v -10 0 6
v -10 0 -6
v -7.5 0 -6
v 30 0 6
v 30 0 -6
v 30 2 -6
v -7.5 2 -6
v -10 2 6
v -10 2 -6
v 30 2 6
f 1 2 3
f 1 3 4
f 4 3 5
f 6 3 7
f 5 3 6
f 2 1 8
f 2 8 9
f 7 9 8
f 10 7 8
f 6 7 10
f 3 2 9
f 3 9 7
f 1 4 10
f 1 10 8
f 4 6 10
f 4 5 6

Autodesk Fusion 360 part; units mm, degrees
sketch "Esquisse1" plane through (0, 0, 0) normal (0, 1, 0) x (1, 0, 0)
  line L0 (-10, 6) -> (30, 6)
  line L1 (30, 6) -> (30, -6)
  line L2 (30, -6) -> (-10, -6)
  line L3 (-10, -6) -> (-10, 6)
  line L4 (-10, 6) -> (-10, -6)
  line L5 (30, -6) -> (30, 6)
  line L6 (-7.5, 6) -> (-10, 6)
  line L7 (-10, 6) -> (-10, -6)
  line L8 (30, 6) -> (30, -6)
extrude "Extrusion5" add sketch "Esquisse1" along normal blind 2
